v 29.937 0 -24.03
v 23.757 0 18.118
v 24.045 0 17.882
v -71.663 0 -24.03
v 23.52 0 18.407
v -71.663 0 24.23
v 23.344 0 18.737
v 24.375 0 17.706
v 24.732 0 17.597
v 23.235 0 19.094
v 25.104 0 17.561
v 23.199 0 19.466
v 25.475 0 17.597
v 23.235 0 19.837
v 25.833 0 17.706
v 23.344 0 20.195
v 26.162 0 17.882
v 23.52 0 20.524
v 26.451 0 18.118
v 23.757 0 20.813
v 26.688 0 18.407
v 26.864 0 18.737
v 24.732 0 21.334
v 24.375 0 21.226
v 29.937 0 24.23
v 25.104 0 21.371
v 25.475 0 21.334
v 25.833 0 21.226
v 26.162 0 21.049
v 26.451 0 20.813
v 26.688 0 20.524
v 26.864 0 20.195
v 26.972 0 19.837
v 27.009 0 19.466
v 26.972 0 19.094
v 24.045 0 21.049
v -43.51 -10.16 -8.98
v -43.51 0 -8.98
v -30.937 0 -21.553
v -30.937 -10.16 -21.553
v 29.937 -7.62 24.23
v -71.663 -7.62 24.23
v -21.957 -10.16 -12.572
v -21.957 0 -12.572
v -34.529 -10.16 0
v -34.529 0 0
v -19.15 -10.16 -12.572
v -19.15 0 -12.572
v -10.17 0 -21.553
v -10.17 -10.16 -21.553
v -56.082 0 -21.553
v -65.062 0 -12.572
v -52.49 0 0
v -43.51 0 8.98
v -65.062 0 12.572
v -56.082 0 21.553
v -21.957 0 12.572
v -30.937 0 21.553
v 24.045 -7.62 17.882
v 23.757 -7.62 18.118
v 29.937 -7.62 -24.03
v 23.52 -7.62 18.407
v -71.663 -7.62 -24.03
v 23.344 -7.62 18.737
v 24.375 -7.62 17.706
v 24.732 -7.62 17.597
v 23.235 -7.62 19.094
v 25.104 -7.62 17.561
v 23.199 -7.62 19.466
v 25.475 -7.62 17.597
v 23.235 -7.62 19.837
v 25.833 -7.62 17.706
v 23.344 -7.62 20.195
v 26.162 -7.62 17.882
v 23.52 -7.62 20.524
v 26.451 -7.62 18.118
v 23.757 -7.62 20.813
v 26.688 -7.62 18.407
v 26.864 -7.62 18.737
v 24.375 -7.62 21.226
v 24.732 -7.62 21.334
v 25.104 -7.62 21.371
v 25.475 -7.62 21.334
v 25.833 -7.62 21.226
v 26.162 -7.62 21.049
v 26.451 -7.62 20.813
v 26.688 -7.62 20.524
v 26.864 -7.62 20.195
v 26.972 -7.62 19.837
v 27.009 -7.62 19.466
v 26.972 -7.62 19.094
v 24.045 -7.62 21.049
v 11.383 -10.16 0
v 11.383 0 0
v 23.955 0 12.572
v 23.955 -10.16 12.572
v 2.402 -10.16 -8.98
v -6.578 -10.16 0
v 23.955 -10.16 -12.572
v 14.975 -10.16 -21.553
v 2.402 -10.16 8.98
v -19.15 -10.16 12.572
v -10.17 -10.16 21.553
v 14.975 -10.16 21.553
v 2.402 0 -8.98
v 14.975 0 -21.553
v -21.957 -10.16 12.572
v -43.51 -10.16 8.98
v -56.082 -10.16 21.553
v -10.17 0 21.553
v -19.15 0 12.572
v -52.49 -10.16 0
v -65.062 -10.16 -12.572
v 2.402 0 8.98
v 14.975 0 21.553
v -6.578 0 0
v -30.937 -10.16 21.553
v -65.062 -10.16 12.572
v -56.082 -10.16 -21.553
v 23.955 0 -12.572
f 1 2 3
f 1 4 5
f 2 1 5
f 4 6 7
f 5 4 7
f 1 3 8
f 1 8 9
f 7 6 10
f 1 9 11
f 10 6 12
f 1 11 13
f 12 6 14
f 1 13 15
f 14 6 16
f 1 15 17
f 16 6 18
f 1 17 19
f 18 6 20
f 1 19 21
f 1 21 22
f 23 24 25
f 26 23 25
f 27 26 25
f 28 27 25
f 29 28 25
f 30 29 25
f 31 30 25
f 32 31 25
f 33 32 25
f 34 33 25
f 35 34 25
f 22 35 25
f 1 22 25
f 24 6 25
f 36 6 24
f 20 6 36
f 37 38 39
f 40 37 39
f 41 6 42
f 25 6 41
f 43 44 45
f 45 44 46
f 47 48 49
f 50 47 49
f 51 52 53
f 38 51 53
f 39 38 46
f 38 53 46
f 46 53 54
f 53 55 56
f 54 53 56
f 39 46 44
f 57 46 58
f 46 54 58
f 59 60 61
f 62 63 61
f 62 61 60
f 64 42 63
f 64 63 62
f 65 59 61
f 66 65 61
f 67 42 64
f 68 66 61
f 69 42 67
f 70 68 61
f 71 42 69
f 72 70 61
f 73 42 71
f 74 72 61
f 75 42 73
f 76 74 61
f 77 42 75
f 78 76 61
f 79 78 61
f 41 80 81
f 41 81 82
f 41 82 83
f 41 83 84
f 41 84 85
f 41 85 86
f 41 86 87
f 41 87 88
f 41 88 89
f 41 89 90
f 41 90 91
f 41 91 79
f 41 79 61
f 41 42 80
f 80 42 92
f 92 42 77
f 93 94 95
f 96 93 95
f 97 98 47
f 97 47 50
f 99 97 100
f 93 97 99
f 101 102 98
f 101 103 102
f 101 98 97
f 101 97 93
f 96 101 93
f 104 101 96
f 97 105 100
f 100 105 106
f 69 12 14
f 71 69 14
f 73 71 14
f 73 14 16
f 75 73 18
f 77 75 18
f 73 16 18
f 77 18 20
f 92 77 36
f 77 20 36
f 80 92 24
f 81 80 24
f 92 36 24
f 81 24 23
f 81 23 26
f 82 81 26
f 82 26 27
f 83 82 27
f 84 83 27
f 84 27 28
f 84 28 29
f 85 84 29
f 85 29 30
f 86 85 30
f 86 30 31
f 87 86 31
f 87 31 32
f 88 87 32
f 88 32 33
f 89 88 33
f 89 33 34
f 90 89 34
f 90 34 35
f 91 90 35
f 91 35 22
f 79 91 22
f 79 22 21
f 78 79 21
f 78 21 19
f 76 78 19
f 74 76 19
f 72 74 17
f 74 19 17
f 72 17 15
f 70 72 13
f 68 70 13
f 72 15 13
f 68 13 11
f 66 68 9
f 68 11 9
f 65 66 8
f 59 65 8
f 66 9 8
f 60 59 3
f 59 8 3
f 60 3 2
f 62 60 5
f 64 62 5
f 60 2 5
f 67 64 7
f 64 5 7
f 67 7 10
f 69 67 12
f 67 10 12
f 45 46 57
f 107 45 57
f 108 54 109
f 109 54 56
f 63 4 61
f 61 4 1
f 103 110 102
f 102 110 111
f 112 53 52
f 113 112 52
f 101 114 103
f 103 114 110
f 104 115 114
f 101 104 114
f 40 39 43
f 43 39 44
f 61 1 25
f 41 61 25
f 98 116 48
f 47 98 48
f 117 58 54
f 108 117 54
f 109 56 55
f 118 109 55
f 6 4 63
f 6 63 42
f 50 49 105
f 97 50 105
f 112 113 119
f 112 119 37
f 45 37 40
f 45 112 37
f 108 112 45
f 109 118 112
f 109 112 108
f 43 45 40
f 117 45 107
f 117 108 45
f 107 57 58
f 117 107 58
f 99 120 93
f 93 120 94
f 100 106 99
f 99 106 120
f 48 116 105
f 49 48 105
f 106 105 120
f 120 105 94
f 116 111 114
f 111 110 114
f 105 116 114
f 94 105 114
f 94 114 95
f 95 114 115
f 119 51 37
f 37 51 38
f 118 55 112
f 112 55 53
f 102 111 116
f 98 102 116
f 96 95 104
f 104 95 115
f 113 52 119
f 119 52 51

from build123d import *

# Parameters (mm, degrees)
F1_DEPTH = 10.16
F3_W     = 101.6
F3_H     = 48.26
F4_DEPTH = 7.62
F6_D     = 3.81
F7_DEPTH = 10.16


with BuildPart() as f1:
    # F0 (on Front) → F1 (new body)
    with BuildSketch(Plane.XZ):
        Polygon((-65.0621421844, 12.5723585695), (-52.4897836149, 0), (-65.0621421844, -12.5723585695), (-56.0818860633, -21.5526146906), (-43.5095274938, -8.9802561211), (-30.9371689243, -21.5526146906), (-21.9569128032, -12.5723585695), (-34.5292713727, 0), (-21.9569128032, 12.5723585695), (-30.9371689243, 21.5526146906), (-43.5095274938, 8.9802561211), (-56.0818860633, 21.5526146906), align=None)
    extrude(amount=F1_DEPTH)


with BuildPart() as f4:
    # F3 (on Front) → F4 (new body)
    with BuildSketch(Plane.XZ):
        with Locations((-20.8633753091, 0.1001527655)):
            Rectangle(F3_W, F3_H)
    extrude(amount=F4_DEPTH)

    # F6 (through all)
    with Locations(Plane.XZ.offset(7.62)):
        with Locations((25.1038074493, 19.465520978)):
            Hole(F6_D / 2)


with BuildPart() as f7:
    # F2 (on Front) → F7 (new body)
    with BuildSketch(Plane.XZ):
        Polygon((-19.1503611602, 12.5723585695), (-6.5780025907, 0), (-19.1503611602, -12.5723585695), (-10.1701050391, -21.5526146906), (2.4022535304, -8.9802561211), (14.9746120999, -21.5526146906), (23.9548682209, -12.5723585695), (11.3825096515, 0), (23.9548682209, 12.5723585695), (14.9746120999, 21.5526146906), (2.4022535304, 8.9802561211), (-10.1701050391, 21.5526146906), align=None)
    extrude(amount=F7_DEPTH)


solid = Compound([f1.part, f4.part, f7.part])
